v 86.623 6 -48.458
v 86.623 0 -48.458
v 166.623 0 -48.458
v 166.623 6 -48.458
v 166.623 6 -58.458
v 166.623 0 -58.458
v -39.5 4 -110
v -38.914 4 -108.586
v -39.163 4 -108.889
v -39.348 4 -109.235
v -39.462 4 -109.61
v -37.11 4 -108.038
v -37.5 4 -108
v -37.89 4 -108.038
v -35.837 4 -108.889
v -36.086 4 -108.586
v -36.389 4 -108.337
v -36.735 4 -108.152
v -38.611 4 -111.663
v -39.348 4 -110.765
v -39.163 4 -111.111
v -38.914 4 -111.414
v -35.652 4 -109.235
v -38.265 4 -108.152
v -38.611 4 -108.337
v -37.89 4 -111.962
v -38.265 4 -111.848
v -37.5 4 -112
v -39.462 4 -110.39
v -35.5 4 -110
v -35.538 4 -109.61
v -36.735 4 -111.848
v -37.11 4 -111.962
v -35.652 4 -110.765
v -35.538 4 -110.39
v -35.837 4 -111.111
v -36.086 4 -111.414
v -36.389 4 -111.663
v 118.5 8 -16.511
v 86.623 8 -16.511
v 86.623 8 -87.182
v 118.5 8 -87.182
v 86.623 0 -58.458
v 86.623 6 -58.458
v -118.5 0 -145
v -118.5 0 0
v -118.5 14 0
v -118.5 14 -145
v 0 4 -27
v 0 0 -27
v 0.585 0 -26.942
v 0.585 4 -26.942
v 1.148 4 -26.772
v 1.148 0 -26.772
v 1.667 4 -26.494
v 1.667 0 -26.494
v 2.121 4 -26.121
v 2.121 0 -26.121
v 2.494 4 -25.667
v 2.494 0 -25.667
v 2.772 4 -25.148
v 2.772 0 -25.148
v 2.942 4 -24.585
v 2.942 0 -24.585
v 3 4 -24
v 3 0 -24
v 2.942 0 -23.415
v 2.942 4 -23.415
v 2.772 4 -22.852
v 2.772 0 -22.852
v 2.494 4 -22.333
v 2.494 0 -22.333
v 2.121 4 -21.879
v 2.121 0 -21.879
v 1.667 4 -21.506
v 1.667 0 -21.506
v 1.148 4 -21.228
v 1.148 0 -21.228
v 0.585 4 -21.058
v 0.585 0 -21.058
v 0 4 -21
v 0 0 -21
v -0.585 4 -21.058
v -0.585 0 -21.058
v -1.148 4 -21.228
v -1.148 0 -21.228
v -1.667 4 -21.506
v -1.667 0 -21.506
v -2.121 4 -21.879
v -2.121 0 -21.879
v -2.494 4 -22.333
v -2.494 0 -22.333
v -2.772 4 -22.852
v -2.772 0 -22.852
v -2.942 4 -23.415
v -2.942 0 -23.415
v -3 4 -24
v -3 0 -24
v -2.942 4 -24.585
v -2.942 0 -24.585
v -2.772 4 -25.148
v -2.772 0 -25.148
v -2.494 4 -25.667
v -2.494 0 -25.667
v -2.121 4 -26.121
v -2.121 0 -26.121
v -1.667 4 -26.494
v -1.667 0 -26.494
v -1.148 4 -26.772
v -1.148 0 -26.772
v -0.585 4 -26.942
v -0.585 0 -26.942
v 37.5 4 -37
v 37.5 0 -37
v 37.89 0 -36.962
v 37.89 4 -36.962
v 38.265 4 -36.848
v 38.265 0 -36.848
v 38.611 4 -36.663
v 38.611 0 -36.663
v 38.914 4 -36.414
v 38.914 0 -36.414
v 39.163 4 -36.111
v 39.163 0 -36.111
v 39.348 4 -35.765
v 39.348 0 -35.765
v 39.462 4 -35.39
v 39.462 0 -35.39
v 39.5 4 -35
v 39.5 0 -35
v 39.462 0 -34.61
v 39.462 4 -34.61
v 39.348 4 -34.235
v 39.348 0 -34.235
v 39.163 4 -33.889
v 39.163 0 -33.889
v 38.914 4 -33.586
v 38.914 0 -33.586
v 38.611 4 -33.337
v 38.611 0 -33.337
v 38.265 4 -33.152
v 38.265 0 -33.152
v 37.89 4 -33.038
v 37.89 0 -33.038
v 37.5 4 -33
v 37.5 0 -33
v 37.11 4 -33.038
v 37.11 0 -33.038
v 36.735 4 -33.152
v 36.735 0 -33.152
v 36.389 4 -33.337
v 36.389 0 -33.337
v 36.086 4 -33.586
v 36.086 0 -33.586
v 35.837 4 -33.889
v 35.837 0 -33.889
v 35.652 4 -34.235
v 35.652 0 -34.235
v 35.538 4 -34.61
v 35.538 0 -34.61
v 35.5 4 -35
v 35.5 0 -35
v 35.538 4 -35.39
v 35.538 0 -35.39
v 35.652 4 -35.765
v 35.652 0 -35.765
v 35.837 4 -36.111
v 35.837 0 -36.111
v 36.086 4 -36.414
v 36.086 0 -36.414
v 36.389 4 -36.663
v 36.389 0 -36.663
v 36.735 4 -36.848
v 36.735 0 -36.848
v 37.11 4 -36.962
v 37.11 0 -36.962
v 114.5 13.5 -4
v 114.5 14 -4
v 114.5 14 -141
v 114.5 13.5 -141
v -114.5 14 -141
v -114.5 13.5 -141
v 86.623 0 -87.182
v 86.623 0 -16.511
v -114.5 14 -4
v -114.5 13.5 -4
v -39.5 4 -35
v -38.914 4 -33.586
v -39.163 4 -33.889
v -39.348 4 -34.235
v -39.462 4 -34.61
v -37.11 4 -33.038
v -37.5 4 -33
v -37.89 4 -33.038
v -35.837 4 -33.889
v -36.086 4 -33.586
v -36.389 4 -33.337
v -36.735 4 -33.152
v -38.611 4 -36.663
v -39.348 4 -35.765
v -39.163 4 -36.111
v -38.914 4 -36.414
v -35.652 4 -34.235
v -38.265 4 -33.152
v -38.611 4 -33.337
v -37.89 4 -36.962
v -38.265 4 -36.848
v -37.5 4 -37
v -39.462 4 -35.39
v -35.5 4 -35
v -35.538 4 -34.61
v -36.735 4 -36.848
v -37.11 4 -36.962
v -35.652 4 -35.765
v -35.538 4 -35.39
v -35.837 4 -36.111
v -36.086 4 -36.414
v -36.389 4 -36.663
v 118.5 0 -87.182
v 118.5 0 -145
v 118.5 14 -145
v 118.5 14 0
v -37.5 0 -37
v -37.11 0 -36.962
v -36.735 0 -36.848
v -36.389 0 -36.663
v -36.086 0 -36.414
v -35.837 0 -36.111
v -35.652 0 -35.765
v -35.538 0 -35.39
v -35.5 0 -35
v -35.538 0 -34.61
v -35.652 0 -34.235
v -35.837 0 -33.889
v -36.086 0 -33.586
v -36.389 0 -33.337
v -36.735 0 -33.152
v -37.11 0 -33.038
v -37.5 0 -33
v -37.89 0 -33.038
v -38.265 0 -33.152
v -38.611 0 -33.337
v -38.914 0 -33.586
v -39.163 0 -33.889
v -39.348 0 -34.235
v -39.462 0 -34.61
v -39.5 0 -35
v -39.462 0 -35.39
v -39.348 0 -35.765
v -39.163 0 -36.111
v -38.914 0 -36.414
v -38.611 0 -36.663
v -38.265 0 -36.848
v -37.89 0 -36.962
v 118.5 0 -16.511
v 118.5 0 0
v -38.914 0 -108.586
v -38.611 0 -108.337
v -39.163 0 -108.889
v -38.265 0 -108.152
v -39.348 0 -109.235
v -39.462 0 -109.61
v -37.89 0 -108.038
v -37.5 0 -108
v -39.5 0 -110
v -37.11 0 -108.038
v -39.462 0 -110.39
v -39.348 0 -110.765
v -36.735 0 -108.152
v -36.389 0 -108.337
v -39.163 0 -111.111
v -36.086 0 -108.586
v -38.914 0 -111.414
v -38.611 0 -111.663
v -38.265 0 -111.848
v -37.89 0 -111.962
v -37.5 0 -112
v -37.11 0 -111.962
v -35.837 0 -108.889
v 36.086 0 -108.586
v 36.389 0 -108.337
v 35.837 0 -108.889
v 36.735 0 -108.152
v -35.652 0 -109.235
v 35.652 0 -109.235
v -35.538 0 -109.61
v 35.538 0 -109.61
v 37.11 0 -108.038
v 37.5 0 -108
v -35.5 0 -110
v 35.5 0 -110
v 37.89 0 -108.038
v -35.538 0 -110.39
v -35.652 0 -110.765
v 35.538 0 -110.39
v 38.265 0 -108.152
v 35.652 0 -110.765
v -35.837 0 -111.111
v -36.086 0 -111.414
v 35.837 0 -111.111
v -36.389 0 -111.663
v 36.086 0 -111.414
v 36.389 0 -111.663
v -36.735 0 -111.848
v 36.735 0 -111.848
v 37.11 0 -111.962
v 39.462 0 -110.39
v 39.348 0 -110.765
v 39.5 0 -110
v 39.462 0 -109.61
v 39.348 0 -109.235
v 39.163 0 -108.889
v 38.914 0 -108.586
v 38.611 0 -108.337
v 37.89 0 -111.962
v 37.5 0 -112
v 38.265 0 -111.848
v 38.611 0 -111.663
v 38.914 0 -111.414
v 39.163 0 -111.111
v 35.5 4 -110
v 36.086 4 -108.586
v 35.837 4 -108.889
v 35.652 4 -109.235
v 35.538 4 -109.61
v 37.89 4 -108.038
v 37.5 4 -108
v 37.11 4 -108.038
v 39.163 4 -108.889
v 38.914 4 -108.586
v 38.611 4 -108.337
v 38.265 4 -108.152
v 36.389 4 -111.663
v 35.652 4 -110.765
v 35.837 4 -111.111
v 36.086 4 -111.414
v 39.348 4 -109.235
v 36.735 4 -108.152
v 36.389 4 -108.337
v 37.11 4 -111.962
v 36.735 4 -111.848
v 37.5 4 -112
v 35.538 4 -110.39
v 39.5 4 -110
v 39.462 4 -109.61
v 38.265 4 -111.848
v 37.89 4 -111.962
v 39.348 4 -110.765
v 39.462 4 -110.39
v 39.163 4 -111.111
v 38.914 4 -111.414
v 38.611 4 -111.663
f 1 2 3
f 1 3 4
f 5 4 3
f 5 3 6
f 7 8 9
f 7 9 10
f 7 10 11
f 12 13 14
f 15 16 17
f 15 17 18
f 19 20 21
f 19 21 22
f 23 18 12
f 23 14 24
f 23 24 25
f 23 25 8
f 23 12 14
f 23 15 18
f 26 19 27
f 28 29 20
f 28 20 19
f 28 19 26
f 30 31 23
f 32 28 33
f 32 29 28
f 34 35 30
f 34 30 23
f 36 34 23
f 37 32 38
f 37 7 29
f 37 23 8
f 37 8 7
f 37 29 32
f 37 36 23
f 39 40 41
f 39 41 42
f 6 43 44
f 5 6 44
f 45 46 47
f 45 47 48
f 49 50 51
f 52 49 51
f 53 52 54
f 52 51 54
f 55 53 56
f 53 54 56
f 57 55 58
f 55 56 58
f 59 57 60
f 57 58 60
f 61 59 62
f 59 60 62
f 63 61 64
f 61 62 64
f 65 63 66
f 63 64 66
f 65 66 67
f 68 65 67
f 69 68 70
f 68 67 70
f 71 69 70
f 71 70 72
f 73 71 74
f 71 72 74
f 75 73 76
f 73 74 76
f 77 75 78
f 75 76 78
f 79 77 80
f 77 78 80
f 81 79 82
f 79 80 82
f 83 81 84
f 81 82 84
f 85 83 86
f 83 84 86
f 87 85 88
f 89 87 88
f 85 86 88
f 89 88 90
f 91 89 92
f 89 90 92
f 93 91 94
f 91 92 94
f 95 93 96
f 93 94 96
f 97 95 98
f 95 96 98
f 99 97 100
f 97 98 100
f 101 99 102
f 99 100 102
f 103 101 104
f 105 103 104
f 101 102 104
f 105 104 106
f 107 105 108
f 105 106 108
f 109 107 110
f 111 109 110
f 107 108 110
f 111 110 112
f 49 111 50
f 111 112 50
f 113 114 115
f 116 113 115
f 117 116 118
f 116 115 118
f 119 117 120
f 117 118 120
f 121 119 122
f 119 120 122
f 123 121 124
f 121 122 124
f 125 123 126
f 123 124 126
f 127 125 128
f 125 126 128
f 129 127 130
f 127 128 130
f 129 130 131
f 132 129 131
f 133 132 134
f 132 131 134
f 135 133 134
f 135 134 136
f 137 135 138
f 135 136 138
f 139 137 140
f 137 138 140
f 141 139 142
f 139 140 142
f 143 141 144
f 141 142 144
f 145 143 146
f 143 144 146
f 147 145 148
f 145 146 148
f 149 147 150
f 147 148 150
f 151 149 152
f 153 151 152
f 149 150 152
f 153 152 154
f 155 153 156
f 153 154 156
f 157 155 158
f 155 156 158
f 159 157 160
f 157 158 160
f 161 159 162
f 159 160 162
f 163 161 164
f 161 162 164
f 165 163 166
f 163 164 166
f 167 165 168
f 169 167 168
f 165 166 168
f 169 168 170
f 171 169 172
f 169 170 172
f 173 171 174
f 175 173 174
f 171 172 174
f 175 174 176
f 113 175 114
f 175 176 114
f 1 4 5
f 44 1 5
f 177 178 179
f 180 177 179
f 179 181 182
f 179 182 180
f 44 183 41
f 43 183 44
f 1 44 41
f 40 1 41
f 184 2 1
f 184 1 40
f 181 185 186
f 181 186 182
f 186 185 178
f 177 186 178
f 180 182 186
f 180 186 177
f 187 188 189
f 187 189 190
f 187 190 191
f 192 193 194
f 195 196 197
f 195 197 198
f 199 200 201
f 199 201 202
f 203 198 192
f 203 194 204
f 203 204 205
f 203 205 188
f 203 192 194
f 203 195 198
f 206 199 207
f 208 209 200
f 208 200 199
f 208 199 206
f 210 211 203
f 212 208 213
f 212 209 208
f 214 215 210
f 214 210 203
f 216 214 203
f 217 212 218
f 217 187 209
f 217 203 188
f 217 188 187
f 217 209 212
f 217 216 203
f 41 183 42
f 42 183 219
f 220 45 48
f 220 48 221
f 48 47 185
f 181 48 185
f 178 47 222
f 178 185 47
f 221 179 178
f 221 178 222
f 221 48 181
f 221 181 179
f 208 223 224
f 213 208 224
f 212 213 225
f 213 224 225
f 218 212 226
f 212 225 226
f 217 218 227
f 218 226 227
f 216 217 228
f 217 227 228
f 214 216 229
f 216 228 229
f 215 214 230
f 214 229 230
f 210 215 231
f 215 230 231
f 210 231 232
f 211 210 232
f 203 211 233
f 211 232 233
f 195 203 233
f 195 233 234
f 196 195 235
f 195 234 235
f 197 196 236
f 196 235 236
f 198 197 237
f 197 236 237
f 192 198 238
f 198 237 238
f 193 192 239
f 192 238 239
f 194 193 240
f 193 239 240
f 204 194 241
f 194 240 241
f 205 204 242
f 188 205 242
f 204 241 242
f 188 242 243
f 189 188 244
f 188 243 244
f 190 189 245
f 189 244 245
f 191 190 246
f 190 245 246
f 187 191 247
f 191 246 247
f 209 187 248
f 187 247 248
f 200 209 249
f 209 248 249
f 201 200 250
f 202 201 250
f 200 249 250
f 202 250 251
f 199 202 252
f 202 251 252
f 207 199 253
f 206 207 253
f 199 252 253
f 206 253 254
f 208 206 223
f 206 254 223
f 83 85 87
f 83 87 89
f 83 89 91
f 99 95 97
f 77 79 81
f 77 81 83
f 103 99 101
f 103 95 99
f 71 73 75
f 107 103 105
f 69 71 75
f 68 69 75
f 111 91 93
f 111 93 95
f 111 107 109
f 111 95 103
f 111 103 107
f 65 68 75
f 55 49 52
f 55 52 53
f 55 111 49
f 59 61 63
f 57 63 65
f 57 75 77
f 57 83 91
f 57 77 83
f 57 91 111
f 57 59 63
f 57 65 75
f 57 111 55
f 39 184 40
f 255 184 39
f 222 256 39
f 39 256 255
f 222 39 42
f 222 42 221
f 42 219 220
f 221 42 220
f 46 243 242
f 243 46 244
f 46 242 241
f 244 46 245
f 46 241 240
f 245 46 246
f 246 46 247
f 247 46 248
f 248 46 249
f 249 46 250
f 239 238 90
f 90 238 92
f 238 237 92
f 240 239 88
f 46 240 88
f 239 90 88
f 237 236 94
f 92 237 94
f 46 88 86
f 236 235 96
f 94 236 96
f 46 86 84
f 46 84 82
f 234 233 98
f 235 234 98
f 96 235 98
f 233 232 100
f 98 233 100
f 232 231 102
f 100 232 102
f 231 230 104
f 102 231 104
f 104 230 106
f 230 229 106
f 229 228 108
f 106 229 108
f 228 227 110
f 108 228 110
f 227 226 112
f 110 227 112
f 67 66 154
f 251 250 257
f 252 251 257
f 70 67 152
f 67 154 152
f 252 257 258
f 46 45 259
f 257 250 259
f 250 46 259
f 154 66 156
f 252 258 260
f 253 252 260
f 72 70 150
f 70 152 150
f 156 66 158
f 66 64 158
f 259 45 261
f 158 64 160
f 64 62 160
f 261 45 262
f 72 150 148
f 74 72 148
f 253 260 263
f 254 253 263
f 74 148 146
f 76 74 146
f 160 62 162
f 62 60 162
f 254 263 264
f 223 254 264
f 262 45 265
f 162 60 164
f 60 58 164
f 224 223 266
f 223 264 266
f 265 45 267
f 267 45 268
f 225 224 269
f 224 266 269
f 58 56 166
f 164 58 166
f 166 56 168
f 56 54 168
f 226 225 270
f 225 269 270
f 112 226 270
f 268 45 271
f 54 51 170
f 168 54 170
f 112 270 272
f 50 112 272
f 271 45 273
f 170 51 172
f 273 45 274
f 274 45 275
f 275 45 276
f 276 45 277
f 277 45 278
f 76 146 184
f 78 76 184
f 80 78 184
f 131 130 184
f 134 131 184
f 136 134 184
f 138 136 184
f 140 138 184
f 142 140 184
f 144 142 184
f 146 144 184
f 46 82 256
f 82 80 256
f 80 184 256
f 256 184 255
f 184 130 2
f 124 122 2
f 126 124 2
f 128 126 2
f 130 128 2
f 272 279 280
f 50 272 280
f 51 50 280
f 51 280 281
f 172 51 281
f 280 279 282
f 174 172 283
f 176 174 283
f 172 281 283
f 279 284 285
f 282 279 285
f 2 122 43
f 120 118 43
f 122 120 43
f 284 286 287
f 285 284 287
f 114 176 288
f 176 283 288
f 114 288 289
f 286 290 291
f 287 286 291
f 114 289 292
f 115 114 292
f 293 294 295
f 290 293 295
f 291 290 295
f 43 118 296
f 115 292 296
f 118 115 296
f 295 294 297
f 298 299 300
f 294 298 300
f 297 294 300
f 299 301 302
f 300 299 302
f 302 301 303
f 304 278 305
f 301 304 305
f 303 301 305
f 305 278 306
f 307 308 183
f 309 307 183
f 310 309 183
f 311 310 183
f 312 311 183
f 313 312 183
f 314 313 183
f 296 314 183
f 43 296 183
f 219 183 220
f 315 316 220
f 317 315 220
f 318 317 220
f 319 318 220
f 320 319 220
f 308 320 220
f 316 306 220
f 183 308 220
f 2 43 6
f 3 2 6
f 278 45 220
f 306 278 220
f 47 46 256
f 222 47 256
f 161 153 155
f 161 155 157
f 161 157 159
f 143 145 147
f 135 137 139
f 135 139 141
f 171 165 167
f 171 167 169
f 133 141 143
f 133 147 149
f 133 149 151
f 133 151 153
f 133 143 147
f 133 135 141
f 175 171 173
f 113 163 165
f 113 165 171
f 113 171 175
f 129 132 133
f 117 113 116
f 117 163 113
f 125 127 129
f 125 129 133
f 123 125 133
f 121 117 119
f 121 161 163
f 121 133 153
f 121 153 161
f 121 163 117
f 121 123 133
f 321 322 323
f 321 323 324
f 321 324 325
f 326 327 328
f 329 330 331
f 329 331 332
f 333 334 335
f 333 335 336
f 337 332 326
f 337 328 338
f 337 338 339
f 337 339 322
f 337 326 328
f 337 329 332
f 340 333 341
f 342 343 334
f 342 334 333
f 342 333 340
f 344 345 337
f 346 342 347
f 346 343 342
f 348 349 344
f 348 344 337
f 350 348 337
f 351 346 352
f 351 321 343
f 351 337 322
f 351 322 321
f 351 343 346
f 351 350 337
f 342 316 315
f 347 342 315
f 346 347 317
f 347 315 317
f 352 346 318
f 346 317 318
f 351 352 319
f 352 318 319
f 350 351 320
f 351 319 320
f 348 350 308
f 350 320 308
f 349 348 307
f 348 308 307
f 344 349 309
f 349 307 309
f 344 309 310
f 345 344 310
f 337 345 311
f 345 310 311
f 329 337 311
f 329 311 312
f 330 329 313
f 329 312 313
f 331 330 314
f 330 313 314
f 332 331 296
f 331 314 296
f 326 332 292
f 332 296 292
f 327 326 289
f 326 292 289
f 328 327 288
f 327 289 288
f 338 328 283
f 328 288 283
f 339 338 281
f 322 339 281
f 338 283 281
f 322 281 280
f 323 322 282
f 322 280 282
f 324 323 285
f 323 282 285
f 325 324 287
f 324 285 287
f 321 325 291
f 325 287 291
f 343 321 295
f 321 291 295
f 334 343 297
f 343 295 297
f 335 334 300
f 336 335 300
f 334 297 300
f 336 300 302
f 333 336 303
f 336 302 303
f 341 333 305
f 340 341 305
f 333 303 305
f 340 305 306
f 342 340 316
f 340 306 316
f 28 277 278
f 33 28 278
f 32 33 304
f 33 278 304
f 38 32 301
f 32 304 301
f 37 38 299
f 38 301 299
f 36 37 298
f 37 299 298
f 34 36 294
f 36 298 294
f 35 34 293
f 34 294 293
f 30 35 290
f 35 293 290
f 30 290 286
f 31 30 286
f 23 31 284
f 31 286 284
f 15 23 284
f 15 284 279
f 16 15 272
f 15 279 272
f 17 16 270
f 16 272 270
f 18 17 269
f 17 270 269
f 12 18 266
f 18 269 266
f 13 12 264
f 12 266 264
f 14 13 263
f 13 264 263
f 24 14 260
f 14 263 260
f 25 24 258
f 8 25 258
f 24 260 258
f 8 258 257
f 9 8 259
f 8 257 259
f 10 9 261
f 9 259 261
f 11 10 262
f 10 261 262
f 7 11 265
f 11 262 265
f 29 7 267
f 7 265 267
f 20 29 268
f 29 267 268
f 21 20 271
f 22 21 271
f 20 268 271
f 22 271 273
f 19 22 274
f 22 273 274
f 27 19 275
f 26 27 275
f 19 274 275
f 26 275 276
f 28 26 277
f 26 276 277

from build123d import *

# Parameters (mm, degrees)
SKETCH_1_W          = 237
SKETCH_1_H          = 145
EXTRUDE_1_DEPTH     = 14
SKETCH_2_R          = 2
SKETCH_2_R_2        = 3
CUT_EXTRUDE_1_DEPTH = 4
SKETCH_3_W          = 31.876725666
SKETCH_3_H          = 70.670873742
CUT_EXTRUDE_2_DEPTH = 8
SKETCH_4_W          = 229
SKETCH_4_H          = 137
CUT_EXTRUDE_3_DEPTH = 0.5
SKETCH_5_W          = 10
SKETCH_5_H          = 6
EXTRUDE_2_DEPTH     = 80


with BuildPart() as part:
    # 草图1 → 凸台-拉伸1 (new body)
    with BuildSketch(Plane(origin=(0, 0, 0), x_dir=(1, 0, 0), z_dir=(0, 1, 0))):
        with Locations((0, 72.5)):
            Rectangle(SKETCH_1_W, SKETCH_1_H)
    extrude(amount=EXTRUDE_1_DEPTH)

    # 草图2 → 切除-拉伸1 (cut)
    with BuildSketch(Plane.XZ):
        with Locations(Location((37.5, -110, 0), (0, 0, 270))):
            Circle(SKETCH_2_R)
        with Locations(Location((-37.5, -110, 0), (0, 0, 270))):
            Circle(SKETCH_2_R)
        with Locations(Location((-37.5, -35, 0), (0, 0, 270))):
            Circle(SKETCH_2_R)
        with Locations(Location((37.5, -35, 0), (0, 0, 270))):
            Circle(SKETCH_2_R)
        with Locations(Location((0, -24, 0), (0, 0, 270))):
            Circle(SKETCH_2_R_2)
    extrude(amount=-CUT_EXTRUDE_1_DEPTH, mode=Mode.SUBTRACT)

    # 草图3 → 切除-拉伸2 (cut)
    with BuildSketch(Plane.XZ):
        with Locations((102.561637167, -51.846473886)):
            Rectangle(SKETCH_3_W, SKETCH_3_H)
    extrude(amount=-CUT_EXTRUDE_2_DEPTH, mode=Mode.SUBTRACT)

    # 草图4 → 切除-拉伸3 (cut)
    with BuildSketch(Plane(origin=(0, 14, 0), x_dir=(1, 0, 0), z_dir=(0, 1, 0))):
        with Locations((0, 72.5)):
            Rectangle(SKETCH_4_W, SKETCH_4_H)
    extrude(amount=-CUT_EXTRUDE_3_DEPTH, mode=Mode.SUBTRACT)

    # 草图5 → 凸台-拉伸2 (add)
    with BuildSketch(Plane(origin=(86.623274334, 0, 0), x_dir=(0, 0, -1), z_dir=(1, 0, 0))):
        with Locations((53.458325759, 3)):
            Rectangle(SKETCH_5_W, SKETCH_5_H)
    extrude(amount=EXTRUDE_2_DEPTH)


solid = part.part
